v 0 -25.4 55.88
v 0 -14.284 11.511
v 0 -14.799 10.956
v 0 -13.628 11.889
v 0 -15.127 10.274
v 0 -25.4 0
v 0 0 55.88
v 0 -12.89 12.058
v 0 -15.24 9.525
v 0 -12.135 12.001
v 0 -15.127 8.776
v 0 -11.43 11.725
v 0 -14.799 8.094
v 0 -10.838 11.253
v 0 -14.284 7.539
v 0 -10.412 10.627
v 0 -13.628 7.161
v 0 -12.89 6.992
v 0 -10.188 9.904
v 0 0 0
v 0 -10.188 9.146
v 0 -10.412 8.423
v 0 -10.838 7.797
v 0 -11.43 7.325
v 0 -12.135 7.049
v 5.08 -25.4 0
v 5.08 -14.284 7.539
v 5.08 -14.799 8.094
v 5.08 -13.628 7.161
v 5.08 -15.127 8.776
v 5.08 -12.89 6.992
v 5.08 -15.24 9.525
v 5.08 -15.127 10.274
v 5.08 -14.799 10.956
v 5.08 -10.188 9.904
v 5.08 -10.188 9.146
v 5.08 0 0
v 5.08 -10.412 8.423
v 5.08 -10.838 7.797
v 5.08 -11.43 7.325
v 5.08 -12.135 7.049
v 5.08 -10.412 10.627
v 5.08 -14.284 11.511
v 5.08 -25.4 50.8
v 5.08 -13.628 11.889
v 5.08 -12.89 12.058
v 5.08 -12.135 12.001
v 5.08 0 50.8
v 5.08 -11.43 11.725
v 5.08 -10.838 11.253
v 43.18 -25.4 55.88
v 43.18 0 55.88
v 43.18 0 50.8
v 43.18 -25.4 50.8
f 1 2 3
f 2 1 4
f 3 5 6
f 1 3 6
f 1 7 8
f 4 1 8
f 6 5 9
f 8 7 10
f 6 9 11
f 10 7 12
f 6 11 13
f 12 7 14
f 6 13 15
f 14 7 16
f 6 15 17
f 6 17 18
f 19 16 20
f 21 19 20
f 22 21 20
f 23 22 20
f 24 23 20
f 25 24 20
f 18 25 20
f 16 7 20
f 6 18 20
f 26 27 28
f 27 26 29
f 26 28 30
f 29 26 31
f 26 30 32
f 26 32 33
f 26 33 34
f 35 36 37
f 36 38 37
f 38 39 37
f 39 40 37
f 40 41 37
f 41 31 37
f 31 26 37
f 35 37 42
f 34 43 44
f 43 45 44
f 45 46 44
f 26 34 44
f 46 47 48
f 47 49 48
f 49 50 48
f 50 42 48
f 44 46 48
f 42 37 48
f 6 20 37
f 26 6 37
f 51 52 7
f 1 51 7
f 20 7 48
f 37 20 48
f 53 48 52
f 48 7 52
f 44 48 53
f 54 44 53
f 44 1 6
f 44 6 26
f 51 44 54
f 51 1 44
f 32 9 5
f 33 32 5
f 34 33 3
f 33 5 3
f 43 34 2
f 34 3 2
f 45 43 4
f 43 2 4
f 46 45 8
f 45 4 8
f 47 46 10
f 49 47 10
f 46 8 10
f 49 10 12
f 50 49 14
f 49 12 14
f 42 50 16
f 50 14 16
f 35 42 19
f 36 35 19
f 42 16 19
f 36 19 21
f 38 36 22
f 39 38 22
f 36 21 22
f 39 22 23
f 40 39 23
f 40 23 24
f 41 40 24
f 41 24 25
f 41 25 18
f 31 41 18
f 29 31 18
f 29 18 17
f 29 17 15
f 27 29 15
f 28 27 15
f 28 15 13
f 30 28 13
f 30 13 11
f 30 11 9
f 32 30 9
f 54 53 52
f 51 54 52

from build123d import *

# Parameters (mm, degrees)
F0_W     = 38.1
F0_H     = 5.08
F1_DEPTH = 25.4
F2_R     = 2.54
F3_DEPTH = 25.4


with BuildPart() as f1:
    # F0 (on Front) → F1 (new body)
    with BuildSketch(Plane.XZ):
        with Locations((24.13, 53.34)):
            Rectangle(F0_W, F0_H)
        Polygon((0, 55.88), (0, 0), (5.08, 0), (5.08, 50.8), (5.08, 55.88), align=None)
    extrude(amount=F1_DEPTH)

    # F2 (on face) → F3 (cut)
    with BuildSketch(Plane(origin=(0, 0, 0), x_dir=(0, -1, 0), z_dir=(-1, 0, 0))):
        with Locations((12.7, 9.525)):
            Circle(F2_R)
    extrude(amount=-F3_DEPTH, mode=Mode.SUBTRACT)


solid = f1.part
